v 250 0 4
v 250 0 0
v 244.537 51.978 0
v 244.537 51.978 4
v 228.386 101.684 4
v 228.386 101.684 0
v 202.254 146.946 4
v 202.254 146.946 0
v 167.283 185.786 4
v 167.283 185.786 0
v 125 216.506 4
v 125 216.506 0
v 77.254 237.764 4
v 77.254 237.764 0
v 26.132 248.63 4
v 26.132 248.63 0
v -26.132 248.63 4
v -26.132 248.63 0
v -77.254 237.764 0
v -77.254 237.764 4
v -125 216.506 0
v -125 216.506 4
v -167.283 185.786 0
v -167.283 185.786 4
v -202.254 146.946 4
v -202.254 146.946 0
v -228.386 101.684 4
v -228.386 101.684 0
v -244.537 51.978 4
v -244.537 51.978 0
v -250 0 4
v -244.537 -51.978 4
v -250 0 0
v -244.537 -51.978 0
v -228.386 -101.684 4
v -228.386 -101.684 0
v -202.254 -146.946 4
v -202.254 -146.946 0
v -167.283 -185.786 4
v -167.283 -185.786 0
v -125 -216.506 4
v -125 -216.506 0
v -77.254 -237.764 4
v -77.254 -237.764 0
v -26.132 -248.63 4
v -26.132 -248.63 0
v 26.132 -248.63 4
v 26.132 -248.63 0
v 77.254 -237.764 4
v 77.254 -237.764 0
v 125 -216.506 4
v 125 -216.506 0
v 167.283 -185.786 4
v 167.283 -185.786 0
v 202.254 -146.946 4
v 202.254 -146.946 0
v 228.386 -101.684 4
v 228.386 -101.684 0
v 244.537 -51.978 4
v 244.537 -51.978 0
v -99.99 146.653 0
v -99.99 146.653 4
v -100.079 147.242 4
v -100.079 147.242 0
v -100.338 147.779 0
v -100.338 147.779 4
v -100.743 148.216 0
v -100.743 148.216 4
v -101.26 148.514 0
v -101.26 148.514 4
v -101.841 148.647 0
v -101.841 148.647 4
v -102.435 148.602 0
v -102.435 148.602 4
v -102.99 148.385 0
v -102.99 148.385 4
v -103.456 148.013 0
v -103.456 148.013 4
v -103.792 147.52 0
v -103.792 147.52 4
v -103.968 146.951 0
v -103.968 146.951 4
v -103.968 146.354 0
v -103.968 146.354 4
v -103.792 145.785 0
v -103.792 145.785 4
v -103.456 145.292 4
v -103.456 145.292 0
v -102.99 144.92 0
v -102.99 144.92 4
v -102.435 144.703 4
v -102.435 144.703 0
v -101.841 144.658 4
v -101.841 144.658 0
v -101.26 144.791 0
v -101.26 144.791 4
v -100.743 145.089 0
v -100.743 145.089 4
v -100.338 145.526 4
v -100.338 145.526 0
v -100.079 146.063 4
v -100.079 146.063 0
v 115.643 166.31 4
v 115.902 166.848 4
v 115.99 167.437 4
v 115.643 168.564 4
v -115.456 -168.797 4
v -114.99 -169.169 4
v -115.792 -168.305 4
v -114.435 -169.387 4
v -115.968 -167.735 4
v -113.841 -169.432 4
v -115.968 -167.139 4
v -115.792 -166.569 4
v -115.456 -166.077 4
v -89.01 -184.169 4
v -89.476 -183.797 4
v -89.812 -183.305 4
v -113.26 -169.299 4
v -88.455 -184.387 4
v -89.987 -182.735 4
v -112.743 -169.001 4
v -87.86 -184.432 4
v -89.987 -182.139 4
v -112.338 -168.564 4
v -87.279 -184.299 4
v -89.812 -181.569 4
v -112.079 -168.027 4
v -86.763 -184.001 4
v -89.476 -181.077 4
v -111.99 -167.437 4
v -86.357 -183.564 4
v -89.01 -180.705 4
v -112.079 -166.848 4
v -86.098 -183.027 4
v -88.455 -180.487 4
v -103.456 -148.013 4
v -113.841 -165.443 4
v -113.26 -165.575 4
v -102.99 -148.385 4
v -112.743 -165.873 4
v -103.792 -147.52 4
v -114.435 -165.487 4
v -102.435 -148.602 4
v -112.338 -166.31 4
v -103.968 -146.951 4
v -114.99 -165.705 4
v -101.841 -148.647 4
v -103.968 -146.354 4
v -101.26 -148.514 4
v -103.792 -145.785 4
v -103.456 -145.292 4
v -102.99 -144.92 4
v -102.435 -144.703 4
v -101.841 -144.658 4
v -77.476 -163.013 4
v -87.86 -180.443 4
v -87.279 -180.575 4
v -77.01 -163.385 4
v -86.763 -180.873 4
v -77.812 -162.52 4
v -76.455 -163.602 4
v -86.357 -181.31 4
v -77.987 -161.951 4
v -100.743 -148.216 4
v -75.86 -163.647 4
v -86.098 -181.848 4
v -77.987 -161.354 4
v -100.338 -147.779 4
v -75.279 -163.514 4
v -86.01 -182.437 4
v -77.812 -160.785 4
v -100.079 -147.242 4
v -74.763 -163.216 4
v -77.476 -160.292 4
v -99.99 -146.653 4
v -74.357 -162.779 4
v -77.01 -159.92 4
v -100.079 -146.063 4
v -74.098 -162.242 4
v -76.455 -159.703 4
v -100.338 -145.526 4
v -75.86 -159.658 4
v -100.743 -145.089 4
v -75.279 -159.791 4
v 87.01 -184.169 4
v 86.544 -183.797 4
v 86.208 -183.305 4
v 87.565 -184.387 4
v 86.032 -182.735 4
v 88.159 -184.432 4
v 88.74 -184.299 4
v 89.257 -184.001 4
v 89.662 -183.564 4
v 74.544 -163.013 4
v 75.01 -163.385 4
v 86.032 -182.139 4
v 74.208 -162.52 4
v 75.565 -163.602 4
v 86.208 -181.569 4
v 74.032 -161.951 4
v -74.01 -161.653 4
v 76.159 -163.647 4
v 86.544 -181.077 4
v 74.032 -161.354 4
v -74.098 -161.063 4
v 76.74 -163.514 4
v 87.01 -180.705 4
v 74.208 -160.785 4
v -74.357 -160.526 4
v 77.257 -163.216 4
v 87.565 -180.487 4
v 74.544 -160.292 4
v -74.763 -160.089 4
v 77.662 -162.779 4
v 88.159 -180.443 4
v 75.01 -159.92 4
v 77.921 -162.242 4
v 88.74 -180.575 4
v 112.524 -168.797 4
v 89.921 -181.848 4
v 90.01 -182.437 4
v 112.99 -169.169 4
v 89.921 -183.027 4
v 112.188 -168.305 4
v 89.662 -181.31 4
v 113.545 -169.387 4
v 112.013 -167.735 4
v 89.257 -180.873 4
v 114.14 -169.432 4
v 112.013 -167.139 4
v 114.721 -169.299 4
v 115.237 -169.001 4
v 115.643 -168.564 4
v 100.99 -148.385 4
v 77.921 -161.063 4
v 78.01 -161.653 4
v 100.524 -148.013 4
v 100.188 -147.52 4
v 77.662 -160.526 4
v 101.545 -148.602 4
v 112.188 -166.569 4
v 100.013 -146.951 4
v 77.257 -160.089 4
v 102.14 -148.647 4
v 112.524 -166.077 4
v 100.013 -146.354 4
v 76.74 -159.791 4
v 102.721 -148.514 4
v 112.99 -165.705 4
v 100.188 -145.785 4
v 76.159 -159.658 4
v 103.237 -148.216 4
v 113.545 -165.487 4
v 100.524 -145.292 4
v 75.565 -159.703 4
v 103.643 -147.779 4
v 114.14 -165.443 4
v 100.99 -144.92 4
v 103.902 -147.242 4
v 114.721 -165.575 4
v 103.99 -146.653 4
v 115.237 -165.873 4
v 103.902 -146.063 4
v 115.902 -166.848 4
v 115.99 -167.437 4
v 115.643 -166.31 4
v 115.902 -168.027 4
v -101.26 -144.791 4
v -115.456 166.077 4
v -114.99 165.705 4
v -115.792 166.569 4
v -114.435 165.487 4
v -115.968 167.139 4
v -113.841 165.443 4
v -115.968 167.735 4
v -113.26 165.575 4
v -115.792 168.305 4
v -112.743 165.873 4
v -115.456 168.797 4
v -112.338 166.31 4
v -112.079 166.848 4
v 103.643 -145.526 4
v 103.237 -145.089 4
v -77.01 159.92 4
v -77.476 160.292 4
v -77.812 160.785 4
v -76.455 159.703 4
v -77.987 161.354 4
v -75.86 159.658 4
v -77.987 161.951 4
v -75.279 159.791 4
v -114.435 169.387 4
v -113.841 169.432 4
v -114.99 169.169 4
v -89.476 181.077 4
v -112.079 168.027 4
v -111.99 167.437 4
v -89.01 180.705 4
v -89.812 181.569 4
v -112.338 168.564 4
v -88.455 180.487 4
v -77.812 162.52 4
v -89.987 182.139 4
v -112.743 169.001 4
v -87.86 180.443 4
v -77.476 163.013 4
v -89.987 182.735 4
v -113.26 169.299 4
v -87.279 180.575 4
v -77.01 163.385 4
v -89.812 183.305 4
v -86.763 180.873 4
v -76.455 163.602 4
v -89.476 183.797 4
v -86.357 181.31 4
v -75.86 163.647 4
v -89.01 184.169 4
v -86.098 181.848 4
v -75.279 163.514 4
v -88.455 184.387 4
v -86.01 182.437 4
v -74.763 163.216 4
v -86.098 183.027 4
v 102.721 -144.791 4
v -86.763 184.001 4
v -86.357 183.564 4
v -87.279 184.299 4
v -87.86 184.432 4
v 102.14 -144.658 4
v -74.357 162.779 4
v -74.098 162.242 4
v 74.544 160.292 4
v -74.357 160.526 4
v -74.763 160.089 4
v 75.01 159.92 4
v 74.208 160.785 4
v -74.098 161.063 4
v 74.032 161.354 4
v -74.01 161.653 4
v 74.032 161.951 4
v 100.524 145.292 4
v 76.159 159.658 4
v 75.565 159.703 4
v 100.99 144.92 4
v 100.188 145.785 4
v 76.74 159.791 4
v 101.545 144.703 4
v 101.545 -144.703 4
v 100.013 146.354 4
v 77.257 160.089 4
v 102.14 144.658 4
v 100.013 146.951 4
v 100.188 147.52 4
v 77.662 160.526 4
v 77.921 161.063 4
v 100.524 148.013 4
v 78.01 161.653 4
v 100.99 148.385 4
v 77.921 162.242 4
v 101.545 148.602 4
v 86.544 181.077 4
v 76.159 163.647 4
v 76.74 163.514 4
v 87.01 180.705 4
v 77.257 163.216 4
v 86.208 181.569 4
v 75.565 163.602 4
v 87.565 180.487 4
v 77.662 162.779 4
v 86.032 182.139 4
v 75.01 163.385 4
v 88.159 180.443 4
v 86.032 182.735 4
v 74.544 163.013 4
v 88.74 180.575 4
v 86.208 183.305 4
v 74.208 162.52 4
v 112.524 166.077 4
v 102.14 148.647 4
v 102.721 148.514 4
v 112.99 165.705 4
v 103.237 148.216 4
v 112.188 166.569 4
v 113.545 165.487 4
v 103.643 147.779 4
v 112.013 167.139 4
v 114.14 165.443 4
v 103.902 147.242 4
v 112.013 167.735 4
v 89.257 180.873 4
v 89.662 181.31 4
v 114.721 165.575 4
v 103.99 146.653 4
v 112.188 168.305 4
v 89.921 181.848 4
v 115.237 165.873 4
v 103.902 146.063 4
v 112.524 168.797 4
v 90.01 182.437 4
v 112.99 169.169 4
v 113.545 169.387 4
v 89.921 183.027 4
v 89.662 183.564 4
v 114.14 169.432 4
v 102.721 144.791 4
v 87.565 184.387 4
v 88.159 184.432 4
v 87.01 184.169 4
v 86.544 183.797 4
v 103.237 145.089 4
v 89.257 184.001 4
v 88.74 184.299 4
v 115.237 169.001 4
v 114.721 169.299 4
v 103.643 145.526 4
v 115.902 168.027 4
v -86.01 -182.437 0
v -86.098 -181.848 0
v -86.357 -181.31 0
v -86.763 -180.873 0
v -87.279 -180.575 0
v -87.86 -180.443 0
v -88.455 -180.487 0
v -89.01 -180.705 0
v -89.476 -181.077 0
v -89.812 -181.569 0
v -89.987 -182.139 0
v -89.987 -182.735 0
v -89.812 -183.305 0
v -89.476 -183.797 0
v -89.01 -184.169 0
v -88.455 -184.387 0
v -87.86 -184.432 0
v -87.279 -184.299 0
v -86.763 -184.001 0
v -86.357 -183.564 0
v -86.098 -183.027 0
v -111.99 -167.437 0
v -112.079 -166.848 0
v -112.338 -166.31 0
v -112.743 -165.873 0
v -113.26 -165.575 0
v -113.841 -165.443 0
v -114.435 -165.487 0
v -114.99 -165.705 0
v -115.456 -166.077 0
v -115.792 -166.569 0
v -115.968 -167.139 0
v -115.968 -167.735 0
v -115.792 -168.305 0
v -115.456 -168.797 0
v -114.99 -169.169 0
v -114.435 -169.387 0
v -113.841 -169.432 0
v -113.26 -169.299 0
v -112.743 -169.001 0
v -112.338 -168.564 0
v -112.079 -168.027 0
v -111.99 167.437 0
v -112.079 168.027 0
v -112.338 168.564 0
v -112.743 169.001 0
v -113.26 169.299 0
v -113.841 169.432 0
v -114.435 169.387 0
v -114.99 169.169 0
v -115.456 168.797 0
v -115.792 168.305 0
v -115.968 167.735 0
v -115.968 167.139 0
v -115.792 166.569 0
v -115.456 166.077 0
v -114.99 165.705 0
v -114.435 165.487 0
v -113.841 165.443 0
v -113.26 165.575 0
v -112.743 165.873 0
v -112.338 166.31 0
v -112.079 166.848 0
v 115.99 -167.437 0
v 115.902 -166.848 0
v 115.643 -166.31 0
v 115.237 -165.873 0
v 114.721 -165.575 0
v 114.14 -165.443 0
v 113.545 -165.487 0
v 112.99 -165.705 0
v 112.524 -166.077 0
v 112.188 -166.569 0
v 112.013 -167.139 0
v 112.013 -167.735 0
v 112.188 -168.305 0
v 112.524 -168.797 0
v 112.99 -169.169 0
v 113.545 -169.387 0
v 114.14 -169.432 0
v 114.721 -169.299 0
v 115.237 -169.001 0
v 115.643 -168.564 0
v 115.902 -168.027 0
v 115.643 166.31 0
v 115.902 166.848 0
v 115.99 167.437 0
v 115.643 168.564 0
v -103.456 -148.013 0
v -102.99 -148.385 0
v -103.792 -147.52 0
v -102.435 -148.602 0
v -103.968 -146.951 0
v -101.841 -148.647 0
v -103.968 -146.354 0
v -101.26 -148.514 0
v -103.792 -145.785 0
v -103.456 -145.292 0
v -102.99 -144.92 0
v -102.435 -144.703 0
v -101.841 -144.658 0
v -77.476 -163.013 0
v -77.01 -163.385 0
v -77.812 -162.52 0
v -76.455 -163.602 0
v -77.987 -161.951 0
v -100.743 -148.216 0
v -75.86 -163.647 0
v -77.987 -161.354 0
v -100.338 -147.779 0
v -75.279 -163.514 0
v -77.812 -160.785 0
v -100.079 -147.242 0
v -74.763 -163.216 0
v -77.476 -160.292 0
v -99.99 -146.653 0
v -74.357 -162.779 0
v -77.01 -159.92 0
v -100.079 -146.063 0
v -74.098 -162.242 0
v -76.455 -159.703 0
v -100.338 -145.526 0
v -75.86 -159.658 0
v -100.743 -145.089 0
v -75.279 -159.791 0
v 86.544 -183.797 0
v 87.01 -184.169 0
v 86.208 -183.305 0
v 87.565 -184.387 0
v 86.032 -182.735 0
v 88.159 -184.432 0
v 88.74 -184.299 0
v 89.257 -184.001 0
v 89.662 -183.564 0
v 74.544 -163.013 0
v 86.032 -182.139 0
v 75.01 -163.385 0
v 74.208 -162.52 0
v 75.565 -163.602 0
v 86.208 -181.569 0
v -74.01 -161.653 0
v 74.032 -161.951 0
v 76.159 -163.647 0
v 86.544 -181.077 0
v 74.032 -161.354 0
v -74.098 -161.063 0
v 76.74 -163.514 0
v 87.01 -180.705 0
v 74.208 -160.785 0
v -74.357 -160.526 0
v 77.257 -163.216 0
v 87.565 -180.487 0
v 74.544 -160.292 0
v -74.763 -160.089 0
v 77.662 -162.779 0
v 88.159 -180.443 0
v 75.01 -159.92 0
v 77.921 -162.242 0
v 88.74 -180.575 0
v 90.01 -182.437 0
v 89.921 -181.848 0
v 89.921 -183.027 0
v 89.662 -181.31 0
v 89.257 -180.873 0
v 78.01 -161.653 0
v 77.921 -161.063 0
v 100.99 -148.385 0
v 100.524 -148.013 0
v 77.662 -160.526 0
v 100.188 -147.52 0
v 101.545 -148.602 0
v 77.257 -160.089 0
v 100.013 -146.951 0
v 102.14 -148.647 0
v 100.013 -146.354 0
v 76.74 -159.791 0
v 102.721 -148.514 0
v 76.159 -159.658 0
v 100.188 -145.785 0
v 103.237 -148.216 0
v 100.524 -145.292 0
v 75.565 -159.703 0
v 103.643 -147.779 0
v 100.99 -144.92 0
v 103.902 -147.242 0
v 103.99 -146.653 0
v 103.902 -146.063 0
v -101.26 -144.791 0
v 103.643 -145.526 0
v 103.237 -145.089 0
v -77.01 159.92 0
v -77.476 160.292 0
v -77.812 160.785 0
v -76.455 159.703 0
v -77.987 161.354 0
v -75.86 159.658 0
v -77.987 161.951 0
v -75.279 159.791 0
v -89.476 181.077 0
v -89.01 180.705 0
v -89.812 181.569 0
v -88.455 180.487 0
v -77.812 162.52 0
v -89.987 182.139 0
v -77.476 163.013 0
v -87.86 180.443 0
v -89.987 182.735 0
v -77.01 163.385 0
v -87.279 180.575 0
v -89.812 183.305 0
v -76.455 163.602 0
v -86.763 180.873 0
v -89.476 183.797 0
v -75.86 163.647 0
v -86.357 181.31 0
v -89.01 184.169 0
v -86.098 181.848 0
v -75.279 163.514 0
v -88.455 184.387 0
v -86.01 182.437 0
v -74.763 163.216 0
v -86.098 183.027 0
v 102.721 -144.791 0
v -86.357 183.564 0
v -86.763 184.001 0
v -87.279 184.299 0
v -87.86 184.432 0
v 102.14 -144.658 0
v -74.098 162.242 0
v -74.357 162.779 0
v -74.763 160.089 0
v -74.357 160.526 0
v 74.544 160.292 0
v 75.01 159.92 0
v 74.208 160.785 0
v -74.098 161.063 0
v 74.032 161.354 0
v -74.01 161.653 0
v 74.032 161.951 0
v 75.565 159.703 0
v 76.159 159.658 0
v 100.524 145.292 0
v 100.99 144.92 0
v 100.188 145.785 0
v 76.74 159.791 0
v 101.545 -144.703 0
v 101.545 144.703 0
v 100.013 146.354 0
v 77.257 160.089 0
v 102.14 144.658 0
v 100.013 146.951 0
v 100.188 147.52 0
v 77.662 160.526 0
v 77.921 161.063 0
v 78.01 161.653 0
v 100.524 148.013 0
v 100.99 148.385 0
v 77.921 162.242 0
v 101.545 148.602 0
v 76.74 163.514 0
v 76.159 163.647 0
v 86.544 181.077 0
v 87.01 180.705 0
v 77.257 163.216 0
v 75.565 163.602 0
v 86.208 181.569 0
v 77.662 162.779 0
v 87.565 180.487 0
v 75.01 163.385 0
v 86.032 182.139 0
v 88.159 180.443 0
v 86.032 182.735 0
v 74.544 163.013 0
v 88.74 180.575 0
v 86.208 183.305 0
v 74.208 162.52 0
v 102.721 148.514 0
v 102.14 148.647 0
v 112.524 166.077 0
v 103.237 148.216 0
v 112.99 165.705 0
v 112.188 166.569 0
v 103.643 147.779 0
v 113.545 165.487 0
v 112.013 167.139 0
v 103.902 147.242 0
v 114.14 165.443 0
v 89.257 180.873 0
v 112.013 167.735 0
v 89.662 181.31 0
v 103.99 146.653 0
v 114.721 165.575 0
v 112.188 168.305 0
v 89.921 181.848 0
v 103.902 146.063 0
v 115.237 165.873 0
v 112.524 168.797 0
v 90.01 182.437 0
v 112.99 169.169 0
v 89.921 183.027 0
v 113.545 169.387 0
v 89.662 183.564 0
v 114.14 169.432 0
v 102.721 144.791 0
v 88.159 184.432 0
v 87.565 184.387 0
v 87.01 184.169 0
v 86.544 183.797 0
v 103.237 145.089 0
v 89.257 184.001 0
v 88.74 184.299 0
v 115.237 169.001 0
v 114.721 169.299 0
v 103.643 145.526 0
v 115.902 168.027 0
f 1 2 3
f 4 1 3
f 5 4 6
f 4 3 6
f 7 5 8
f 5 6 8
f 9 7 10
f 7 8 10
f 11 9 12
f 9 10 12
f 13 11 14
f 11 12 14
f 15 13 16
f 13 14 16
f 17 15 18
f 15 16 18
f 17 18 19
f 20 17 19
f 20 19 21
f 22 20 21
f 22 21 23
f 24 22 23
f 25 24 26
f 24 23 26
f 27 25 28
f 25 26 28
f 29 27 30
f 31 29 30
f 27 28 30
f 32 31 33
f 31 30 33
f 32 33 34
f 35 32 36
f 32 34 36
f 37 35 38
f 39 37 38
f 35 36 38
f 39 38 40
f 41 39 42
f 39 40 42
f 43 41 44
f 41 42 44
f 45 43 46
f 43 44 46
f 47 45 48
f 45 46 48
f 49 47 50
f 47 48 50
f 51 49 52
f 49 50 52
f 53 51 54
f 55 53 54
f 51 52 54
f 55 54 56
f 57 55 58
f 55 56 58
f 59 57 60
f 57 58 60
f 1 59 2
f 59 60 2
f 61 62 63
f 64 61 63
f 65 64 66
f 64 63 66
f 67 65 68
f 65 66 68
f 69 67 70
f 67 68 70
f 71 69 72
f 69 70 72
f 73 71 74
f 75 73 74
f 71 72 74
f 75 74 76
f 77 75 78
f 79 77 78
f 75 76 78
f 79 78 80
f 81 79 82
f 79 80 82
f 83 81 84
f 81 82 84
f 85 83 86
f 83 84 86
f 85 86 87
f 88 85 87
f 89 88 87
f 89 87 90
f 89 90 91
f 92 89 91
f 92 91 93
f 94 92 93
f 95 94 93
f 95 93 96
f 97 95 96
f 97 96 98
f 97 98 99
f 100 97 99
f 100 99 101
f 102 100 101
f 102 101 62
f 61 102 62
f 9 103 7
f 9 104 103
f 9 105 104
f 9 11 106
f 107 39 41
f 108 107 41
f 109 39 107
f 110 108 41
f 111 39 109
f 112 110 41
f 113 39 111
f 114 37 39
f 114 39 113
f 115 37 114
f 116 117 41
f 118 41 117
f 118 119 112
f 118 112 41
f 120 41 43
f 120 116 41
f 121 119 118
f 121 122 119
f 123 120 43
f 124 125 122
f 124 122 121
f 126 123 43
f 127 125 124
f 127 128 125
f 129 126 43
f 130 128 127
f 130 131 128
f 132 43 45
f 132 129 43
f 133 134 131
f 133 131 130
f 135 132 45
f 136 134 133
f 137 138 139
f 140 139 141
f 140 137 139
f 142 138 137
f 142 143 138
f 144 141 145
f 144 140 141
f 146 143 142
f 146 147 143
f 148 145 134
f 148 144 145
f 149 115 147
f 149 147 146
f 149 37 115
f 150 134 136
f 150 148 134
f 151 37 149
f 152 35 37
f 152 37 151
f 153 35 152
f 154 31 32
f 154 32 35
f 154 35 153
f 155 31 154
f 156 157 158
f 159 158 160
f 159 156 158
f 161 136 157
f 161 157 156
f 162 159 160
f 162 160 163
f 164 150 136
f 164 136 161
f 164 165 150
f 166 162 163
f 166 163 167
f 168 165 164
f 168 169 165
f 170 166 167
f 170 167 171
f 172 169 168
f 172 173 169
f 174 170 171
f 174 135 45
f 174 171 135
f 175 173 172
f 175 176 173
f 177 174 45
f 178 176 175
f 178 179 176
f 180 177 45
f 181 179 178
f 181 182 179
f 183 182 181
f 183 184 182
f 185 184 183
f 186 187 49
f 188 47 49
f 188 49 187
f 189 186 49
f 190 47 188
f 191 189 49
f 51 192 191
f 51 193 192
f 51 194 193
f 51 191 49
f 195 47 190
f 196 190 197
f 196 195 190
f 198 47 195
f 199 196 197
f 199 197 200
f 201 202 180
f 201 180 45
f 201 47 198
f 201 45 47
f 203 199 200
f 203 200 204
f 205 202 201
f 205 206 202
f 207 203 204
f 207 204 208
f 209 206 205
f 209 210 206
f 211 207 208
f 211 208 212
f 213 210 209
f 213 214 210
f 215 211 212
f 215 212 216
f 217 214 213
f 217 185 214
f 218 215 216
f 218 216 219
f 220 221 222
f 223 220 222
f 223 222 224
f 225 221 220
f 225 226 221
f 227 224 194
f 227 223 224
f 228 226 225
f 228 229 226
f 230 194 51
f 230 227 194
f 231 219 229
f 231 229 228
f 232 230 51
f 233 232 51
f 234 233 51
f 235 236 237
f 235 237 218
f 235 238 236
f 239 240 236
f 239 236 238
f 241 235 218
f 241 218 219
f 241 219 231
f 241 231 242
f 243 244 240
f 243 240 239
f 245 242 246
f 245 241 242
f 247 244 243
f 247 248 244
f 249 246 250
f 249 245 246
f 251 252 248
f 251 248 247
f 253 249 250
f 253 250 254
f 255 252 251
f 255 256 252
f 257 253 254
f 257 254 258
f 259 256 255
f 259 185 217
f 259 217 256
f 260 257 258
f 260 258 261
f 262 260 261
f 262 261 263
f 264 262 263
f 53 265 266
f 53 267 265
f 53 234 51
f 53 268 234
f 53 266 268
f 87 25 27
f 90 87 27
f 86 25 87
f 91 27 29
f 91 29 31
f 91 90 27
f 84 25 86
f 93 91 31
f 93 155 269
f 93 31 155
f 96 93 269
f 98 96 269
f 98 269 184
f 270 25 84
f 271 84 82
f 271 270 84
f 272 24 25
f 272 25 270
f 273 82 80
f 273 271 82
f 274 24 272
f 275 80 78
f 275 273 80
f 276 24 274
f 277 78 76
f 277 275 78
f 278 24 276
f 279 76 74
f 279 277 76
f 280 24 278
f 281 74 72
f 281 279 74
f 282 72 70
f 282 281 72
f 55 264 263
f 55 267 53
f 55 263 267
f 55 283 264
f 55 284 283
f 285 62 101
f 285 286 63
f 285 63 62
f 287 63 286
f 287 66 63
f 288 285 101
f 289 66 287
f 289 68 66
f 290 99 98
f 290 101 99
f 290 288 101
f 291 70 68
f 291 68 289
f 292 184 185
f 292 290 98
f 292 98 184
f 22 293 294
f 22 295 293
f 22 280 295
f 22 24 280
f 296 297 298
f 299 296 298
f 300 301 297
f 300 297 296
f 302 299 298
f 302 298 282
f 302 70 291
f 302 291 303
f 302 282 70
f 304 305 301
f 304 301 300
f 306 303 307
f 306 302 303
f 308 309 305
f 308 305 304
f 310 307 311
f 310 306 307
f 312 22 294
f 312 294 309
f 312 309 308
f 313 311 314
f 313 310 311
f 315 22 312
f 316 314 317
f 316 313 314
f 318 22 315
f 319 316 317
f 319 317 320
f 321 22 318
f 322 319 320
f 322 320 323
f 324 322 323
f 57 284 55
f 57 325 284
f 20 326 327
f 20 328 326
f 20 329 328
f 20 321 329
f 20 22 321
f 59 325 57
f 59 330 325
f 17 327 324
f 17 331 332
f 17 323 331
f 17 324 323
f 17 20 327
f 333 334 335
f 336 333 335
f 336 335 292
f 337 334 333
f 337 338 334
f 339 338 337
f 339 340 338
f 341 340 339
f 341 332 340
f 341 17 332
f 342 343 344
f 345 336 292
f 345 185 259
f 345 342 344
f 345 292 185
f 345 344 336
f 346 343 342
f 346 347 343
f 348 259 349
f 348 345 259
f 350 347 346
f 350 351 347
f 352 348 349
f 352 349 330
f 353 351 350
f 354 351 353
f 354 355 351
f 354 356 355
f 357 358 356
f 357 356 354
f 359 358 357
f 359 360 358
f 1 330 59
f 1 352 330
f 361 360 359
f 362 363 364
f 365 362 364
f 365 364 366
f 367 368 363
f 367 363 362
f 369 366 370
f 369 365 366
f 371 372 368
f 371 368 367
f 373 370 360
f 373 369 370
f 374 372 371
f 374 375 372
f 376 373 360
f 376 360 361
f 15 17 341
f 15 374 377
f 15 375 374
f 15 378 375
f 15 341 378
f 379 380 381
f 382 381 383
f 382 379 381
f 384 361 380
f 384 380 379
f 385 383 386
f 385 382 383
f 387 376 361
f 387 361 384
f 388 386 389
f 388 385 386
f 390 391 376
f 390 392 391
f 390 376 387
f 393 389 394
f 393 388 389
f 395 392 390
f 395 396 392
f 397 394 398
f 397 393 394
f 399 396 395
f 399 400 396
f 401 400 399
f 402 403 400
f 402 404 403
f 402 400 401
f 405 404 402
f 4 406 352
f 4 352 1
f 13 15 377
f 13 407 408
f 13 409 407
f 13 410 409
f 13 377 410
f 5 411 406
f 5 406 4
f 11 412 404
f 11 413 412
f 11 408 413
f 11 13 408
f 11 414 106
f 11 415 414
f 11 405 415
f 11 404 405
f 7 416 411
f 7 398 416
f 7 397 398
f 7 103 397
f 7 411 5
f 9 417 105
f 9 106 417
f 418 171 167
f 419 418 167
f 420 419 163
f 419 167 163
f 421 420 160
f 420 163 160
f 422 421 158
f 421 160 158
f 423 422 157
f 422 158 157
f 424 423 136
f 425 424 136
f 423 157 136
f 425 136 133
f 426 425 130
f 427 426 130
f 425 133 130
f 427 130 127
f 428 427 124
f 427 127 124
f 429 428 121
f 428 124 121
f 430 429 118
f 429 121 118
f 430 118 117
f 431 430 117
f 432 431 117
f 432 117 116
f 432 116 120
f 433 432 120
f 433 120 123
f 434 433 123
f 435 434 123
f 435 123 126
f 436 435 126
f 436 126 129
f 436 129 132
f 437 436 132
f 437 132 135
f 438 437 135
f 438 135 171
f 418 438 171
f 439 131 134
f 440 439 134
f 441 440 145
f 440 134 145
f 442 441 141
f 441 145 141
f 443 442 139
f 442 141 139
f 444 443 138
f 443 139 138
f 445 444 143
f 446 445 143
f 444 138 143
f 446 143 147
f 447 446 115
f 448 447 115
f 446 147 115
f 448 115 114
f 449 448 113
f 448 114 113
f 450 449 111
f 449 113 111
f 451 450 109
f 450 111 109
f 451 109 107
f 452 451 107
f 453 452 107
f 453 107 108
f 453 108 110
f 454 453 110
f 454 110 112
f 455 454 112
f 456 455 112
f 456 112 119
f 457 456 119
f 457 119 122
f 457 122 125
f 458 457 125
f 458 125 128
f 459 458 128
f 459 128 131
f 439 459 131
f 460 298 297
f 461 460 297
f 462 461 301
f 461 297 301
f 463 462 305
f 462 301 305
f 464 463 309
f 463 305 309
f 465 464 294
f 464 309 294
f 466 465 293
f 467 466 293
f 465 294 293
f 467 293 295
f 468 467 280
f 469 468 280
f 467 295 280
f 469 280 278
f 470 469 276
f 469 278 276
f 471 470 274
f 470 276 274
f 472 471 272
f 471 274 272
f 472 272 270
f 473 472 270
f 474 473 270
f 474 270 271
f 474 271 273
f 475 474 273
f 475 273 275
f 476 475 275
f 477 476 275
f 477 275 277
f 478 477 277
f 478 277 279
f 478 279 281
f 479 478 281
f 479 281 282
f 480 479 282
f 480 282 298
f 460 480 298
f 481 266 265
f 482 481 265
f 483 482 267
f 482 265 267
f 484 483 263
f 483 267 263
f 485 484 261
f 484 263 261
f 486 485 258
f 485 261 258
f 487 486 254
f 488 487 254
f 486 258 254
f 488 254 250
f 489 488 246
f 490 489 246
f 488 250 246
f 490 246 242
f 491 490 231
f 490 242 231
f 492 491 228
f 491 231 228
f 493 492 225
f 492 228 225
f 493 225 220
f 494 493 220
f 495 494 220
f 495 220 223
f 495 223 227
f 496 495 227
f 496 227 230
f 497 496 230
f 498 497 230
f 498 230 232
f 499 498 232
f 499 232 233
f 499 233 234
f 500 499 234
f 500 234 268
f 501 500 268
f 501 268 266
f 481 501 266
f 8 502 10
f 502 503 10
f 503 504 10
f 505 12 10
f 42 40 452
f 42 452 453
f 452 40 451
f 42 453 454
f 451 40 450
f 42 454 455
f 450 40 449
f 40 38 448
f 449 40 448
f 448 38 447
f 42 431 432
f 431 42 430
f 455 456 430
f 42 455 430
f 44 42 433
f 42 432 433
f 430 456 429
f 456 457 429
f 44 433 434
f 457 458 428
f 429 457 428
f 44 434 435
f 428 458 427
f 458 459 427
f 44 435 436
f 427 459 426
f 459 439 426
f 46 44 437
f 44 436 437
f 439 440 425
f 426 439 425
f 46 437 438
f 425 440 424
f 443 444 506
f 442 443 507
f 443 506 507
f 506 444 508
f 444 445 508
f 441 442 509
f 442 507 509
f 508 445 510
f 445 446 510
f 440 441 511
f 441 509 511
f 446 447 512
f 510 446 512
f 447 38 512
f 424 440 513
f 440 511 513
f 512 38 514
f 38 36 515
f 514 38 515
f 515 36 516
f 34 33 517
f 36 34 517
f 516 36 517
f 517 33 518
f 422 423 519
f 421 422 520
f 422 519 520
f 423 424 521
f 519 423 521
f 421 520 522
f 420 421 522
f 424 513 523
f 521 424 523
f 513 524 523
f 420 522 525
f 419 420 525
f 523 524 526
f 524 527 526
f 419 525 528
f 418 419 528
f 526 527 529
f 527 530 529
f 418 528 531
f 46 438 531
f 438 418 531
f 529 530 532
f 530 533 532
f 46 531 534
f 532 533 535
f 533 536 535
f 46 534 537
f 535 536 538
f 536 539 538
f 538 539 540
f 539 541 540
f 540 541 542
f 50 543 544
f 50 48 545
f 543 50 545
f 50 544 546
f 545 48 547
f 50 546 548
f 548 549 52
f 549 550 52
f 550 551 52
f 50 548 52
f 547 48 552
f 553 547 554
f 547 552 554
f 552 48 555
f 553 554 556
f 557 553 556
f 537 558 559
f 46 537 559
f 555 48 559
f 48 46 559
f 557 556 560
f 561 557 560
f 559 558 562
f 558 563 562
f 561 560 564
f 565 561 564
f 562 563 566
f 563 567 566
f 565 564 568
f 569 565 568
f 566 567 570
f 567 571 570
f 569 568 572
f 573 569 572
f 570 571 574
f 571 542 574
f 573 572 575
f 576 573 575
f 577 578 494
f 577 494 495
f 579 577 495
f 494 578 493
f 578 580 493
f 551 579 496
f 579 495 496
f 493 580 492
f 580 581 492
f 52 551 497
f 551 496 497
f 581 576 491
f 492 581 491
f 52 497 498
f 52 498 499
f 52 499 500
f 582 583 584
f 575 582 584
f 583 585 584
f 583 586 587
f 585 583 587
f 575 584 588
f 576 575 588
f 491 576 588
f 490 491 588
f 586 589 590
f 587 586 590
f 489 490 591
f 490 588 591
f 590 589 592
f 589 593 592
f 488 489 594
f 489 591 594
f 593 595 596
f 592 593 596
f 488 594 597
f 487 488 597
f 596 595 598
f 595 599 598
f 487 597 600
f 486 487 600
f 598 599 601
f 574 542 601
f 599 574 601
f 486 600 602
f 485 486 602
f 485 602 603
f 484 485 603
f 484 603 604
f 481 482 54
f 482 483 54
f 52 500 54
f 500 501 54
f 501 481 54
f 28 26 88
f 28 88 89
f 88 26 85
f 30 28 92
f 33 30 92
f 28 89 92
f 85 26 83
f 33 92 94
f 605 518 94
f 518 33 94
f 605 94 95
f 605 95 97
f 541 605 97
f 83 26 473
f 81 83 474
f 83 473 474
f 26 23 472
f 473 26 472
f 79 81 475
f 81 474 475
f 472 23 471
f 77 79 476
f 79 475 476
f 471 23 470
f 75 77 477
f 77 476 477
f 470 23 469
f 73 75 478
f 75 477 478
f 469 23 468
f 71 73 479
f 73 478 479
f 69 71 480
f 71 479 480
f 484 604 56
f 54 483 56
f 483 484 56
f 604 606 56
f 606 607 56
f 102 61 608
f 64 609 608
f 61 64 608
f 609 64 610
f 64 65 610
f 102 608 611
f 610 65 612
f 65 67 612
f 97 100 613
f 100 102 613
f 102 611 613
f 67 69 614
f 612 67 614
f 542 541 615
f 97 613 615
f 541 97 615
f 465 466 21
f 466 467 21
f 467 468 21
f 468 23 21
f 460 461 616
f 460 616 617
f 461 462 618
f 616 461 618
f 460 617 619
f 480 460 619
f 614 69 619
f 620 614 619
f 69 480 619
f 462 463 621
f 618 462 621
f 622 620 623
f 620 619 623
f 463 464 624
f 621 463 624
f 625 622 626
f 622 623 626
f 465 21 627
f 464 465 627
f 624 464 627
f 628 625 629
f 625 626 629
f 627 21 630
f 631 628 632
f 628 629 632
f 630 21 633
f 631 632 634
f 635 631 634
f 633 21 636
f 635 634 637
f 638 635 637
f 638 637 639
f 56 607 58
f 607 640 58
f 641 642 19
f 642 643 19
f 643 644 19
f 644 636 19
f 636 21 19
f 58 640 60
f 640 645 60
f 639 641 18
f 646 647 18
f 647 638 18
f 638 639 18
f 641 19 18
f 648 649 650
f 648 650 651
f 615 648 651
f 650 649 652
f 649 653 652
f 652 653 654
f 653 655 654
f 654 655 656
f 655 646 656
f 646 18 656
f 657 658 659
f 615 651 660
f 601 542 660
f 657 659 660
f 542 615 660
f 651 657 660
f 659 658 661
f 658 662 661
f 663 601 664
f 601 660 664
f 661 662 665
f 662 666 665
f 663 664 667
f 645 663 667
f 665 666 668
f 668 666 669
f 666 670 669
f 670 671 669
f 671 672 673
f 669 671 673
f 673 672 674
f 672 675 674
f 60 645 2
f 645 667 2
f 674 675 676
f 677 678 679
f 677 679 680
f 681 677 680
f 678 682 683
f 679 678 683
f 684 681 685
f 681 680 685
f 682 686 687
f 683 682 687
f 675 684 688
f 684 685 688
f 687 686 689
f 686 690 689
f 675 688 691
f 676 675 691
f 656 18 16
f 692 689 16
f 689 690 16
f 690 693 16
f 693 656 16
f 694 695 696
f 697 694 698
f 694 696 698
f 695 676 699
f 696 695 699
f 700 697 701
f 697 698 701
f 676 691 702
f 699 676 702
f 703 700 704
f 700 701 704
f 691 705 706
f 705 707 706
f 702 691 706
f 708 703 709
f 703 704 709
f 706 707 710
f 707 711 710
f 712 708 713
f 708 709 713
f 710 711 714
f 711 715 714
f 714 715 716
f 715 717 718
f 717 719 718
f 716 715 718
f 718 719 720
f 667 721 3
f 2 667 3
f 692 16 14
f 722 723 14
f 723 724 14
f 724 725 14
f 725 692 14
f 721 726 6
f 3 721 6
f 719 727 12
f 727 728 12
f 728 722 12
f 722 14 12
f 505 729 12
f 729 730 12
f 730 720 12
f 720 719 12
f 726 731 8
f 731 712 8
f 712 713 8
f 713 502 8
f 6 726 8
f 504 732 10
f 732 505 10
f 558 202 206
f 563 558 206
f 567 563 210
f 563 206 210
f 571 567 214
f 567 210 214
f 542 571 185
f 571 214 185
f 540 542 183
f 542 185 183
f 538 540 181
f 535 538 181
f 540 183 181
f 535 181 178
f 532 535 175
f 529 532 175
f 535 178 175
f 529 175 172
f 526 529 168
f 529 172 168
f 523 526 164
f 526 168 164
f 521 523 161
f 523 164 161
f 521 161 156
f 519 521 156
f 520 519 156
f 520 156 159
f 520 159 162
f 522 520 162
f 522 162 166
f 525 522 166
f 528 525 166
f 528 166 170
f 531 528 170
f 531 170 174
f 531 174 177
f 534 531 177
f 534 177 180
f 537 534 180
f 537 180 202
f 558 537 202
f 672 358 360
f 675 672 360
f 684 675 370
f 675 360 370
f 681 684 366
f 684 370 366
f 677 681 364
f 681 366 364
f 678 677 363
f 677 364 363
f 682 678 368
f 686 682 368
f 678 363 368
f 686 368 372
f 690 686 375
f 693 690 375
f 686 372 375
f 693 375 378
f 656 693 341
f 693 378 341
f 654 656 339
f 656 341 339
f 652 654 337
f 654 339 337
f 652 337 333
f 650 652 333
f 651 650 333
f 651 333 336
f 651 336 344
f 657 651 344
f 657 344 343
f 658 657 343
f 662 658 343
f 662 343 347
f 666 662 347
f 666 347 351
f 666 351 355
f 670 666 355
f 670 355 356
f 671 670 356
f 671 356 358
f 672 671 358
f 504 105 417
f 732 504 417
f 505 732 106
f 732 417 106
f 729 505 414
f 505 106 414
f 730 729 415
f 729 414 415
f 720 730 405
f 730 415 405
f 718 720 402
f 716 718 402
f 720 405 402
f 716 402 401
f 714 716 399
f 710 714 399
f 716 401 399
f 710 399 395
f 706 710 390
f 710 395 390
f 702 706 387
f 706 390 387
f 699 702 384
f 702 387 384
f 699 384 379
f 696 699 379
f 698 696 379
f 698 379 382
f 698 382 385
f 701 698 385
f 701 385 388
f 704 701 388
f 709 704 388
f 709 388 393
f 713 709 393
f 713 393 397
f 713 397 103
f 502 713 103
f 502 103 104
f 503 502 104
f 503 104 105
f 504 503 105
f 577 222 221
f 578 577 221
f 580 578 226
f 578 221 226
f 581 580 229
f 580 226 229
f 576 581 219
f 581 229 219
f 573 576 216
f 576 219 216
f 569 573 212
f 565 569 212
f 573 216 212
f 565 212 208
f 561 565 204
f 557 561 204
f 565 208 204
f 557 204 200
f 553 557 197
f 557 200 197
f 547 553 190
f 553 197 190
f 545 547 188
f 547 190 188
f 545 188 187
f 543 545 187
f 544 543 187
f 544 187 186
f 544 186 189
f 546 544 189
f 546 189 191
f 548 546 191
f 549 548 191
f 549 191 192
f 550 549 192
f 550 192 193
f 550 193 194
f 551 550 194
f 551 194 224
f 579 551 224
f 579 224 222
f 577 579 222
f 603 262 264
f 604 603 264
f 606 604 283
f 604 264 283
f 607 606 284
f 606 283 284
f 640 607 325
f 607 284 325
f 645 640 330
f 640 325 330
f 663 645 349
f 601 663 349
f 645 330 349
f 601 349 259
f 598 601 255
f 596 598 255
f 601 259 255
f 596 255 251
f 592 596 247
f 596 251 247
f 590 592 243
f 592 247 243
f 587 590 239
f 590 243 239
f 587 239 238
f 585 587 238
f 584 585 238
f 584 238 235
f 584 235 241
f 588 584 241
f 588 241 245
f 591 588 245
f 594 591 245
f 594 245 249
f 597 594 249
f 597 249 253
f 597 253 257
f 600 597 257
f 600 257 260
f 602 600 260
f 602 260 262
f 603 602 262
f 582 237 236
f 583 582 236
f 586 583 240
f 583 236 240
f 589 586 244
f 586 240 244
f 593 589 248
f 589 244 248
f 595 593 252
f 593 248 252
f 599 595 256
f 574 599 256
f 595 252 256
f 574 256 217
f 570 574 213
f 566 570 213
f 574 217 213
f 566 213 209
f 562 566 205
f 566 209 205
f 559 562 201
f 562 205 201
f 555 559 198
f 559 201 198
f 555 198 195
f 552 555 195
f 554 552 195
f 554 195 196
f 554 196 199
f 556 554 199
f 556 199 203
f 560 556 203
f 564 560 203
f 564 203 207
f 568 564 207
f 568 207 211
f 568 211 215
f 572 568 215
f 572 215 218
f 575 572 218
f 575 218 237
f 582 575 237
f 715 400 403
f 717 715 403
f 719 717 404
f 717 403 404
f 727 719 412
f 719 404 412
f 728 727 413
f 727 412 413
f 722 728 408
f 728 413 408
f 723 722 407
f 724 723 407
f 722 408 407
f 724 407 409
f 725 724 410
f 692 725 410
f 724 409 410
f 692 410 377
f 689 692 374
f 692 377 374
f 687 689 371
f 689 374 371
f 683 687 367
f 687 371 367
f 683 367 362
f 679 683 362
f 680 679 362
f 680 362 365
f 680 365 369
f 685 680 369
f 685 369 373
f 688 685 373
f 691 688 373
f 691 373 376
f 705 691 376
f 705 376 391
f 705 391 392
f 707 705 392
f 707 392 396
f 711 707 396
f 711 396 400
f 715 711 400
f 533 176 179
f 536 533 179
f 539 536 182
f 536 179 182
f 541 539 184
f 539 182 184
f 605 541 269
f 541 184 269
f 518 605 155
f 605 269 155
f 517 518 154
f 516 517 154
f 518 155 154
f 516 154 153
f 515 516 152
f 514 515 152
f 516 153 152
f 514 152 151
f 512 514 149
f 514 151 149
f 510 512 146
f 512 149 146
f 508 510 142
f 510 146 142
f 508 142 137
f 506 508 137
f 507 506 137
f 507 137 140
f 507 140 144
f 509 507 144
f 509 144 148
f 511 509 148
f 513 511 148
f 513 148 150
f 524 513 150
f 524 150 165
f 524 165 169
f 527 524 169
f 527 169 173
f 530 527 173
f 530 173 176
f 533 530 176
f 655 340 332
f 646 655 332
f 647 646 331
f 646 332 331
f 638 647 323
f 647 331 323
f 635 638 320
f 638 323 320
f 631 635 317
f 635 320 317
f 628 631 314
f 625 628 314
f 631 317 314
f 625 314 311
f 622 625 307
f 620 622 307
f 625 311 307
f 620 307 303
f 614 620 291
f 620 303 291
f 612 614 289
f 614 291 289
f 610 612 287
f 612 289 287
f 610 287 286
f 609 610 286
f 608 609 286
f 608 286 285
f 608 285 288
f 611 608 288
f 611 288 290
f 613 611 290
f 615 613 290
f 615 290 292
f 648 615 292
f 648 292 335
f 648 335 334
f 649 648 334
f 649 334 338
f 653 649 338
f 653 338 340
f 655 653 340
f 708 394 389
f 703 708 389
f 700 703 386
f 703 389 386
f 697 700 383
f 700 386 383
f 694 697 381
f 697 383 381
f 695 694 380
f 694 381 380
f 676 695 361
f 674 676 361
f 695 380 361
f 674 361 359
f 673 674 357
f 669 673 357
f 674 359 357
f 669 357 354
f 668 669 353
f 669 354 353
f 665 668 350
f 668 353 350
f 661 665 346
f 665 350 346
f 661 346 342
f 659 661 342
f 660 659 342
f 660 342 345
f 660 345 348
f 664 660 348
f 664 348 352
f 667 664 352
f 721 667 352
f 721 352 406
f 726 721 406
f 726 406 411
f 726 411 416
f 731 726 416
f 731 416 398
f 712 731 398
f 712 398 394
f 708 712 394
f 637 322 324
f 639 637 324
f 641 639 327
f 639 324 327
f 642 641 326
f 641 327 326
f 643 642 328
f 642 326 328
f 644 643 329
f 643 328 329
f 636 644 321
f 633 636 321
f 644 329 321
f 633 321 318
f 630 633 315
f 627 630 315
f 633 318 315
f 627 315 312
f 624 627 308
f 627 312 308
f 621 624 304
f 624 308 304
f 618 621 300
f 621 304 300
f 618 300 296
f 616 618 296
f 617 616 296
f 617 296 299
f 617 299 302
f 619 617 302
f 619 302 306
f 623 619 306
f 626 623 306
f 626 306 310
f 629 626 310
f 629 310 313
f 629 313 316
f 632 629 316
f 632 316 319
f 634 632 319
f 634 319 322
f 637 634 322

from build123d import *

# Parameters (mm, degrees)
SKETCH1_R           = 250
BOSS_EXTRUDE1_DEPTH = 4
SKETCH5_R           = 2
CUT_EXTRUDE3_DEPTH  = 10


with BuildPart() as part:
    # Sketch1 → Boss-Extrude1 (new body)
    with BuildSketch(Plane.XY):
        Circle(SKETCH1_R)
    extrude(amount=BOSS_EXTRUDE1_DEPTH)

    # Sketch5 → Cut-Extrude3 (cut)
    with BuildSketch(Plane.XY.offset(4)):
        with Locations((-101.990381057, 146.652521874)):
            Circle(SKETCH5_R)
        with Locations((-76.009618943, 161.652521874)):
            Circle(SKETCH5_R)
        with Locations((-113.990381057, 167.437131564)):
            Circle(SKETCH5_R)
        with Locations((-88.009618943, 182.437131564)):
            Circle(SKETCH5_R)
        with Locations((76.009618943, 161.652521874)):
            Circle(SKETCH5_R)
        with Locations((101.990381057, 146.652521874)):
            Circle(SKETCH5_R)
        with Locations((88.009618943, 182.437131564)):
            Circle(SKETCH5_R)
        with Locations((113.990381057, 167.437131564)):
            Circle(SKETCH5_R)
        with Locations((101.990381057, -146.652521874)):
            Circle(SKETCH5_R)
        with Locations((76.009618943, -161.652521874)):
            Circle(SKETCH5_R)
        with Locations((113.990381057, -167.437131564)):
            Circle(SKETCH5_R)
        with Locations((88.009618943, -182.437131564)):
            Circle(SKETCH5_R)
        with Locations((-76.009618943, -161.652521874)):
            Circle(SKETCH5_R)
        with Locations((-101.990381057, -146.652521874)):
            Circle(SKETCH5_R)
        with Locations((-88.009618943, -182.437131564)):
            Circle(SKETCH5_R)
        with Locations((-113.990381057, -167.437131564)):
            Circle(SKETCH5_R)
    extrude(amount=-CUT_EXTRUDE3_DEPTH, mode=Mode.SUBTRACT)


solid = part.part
